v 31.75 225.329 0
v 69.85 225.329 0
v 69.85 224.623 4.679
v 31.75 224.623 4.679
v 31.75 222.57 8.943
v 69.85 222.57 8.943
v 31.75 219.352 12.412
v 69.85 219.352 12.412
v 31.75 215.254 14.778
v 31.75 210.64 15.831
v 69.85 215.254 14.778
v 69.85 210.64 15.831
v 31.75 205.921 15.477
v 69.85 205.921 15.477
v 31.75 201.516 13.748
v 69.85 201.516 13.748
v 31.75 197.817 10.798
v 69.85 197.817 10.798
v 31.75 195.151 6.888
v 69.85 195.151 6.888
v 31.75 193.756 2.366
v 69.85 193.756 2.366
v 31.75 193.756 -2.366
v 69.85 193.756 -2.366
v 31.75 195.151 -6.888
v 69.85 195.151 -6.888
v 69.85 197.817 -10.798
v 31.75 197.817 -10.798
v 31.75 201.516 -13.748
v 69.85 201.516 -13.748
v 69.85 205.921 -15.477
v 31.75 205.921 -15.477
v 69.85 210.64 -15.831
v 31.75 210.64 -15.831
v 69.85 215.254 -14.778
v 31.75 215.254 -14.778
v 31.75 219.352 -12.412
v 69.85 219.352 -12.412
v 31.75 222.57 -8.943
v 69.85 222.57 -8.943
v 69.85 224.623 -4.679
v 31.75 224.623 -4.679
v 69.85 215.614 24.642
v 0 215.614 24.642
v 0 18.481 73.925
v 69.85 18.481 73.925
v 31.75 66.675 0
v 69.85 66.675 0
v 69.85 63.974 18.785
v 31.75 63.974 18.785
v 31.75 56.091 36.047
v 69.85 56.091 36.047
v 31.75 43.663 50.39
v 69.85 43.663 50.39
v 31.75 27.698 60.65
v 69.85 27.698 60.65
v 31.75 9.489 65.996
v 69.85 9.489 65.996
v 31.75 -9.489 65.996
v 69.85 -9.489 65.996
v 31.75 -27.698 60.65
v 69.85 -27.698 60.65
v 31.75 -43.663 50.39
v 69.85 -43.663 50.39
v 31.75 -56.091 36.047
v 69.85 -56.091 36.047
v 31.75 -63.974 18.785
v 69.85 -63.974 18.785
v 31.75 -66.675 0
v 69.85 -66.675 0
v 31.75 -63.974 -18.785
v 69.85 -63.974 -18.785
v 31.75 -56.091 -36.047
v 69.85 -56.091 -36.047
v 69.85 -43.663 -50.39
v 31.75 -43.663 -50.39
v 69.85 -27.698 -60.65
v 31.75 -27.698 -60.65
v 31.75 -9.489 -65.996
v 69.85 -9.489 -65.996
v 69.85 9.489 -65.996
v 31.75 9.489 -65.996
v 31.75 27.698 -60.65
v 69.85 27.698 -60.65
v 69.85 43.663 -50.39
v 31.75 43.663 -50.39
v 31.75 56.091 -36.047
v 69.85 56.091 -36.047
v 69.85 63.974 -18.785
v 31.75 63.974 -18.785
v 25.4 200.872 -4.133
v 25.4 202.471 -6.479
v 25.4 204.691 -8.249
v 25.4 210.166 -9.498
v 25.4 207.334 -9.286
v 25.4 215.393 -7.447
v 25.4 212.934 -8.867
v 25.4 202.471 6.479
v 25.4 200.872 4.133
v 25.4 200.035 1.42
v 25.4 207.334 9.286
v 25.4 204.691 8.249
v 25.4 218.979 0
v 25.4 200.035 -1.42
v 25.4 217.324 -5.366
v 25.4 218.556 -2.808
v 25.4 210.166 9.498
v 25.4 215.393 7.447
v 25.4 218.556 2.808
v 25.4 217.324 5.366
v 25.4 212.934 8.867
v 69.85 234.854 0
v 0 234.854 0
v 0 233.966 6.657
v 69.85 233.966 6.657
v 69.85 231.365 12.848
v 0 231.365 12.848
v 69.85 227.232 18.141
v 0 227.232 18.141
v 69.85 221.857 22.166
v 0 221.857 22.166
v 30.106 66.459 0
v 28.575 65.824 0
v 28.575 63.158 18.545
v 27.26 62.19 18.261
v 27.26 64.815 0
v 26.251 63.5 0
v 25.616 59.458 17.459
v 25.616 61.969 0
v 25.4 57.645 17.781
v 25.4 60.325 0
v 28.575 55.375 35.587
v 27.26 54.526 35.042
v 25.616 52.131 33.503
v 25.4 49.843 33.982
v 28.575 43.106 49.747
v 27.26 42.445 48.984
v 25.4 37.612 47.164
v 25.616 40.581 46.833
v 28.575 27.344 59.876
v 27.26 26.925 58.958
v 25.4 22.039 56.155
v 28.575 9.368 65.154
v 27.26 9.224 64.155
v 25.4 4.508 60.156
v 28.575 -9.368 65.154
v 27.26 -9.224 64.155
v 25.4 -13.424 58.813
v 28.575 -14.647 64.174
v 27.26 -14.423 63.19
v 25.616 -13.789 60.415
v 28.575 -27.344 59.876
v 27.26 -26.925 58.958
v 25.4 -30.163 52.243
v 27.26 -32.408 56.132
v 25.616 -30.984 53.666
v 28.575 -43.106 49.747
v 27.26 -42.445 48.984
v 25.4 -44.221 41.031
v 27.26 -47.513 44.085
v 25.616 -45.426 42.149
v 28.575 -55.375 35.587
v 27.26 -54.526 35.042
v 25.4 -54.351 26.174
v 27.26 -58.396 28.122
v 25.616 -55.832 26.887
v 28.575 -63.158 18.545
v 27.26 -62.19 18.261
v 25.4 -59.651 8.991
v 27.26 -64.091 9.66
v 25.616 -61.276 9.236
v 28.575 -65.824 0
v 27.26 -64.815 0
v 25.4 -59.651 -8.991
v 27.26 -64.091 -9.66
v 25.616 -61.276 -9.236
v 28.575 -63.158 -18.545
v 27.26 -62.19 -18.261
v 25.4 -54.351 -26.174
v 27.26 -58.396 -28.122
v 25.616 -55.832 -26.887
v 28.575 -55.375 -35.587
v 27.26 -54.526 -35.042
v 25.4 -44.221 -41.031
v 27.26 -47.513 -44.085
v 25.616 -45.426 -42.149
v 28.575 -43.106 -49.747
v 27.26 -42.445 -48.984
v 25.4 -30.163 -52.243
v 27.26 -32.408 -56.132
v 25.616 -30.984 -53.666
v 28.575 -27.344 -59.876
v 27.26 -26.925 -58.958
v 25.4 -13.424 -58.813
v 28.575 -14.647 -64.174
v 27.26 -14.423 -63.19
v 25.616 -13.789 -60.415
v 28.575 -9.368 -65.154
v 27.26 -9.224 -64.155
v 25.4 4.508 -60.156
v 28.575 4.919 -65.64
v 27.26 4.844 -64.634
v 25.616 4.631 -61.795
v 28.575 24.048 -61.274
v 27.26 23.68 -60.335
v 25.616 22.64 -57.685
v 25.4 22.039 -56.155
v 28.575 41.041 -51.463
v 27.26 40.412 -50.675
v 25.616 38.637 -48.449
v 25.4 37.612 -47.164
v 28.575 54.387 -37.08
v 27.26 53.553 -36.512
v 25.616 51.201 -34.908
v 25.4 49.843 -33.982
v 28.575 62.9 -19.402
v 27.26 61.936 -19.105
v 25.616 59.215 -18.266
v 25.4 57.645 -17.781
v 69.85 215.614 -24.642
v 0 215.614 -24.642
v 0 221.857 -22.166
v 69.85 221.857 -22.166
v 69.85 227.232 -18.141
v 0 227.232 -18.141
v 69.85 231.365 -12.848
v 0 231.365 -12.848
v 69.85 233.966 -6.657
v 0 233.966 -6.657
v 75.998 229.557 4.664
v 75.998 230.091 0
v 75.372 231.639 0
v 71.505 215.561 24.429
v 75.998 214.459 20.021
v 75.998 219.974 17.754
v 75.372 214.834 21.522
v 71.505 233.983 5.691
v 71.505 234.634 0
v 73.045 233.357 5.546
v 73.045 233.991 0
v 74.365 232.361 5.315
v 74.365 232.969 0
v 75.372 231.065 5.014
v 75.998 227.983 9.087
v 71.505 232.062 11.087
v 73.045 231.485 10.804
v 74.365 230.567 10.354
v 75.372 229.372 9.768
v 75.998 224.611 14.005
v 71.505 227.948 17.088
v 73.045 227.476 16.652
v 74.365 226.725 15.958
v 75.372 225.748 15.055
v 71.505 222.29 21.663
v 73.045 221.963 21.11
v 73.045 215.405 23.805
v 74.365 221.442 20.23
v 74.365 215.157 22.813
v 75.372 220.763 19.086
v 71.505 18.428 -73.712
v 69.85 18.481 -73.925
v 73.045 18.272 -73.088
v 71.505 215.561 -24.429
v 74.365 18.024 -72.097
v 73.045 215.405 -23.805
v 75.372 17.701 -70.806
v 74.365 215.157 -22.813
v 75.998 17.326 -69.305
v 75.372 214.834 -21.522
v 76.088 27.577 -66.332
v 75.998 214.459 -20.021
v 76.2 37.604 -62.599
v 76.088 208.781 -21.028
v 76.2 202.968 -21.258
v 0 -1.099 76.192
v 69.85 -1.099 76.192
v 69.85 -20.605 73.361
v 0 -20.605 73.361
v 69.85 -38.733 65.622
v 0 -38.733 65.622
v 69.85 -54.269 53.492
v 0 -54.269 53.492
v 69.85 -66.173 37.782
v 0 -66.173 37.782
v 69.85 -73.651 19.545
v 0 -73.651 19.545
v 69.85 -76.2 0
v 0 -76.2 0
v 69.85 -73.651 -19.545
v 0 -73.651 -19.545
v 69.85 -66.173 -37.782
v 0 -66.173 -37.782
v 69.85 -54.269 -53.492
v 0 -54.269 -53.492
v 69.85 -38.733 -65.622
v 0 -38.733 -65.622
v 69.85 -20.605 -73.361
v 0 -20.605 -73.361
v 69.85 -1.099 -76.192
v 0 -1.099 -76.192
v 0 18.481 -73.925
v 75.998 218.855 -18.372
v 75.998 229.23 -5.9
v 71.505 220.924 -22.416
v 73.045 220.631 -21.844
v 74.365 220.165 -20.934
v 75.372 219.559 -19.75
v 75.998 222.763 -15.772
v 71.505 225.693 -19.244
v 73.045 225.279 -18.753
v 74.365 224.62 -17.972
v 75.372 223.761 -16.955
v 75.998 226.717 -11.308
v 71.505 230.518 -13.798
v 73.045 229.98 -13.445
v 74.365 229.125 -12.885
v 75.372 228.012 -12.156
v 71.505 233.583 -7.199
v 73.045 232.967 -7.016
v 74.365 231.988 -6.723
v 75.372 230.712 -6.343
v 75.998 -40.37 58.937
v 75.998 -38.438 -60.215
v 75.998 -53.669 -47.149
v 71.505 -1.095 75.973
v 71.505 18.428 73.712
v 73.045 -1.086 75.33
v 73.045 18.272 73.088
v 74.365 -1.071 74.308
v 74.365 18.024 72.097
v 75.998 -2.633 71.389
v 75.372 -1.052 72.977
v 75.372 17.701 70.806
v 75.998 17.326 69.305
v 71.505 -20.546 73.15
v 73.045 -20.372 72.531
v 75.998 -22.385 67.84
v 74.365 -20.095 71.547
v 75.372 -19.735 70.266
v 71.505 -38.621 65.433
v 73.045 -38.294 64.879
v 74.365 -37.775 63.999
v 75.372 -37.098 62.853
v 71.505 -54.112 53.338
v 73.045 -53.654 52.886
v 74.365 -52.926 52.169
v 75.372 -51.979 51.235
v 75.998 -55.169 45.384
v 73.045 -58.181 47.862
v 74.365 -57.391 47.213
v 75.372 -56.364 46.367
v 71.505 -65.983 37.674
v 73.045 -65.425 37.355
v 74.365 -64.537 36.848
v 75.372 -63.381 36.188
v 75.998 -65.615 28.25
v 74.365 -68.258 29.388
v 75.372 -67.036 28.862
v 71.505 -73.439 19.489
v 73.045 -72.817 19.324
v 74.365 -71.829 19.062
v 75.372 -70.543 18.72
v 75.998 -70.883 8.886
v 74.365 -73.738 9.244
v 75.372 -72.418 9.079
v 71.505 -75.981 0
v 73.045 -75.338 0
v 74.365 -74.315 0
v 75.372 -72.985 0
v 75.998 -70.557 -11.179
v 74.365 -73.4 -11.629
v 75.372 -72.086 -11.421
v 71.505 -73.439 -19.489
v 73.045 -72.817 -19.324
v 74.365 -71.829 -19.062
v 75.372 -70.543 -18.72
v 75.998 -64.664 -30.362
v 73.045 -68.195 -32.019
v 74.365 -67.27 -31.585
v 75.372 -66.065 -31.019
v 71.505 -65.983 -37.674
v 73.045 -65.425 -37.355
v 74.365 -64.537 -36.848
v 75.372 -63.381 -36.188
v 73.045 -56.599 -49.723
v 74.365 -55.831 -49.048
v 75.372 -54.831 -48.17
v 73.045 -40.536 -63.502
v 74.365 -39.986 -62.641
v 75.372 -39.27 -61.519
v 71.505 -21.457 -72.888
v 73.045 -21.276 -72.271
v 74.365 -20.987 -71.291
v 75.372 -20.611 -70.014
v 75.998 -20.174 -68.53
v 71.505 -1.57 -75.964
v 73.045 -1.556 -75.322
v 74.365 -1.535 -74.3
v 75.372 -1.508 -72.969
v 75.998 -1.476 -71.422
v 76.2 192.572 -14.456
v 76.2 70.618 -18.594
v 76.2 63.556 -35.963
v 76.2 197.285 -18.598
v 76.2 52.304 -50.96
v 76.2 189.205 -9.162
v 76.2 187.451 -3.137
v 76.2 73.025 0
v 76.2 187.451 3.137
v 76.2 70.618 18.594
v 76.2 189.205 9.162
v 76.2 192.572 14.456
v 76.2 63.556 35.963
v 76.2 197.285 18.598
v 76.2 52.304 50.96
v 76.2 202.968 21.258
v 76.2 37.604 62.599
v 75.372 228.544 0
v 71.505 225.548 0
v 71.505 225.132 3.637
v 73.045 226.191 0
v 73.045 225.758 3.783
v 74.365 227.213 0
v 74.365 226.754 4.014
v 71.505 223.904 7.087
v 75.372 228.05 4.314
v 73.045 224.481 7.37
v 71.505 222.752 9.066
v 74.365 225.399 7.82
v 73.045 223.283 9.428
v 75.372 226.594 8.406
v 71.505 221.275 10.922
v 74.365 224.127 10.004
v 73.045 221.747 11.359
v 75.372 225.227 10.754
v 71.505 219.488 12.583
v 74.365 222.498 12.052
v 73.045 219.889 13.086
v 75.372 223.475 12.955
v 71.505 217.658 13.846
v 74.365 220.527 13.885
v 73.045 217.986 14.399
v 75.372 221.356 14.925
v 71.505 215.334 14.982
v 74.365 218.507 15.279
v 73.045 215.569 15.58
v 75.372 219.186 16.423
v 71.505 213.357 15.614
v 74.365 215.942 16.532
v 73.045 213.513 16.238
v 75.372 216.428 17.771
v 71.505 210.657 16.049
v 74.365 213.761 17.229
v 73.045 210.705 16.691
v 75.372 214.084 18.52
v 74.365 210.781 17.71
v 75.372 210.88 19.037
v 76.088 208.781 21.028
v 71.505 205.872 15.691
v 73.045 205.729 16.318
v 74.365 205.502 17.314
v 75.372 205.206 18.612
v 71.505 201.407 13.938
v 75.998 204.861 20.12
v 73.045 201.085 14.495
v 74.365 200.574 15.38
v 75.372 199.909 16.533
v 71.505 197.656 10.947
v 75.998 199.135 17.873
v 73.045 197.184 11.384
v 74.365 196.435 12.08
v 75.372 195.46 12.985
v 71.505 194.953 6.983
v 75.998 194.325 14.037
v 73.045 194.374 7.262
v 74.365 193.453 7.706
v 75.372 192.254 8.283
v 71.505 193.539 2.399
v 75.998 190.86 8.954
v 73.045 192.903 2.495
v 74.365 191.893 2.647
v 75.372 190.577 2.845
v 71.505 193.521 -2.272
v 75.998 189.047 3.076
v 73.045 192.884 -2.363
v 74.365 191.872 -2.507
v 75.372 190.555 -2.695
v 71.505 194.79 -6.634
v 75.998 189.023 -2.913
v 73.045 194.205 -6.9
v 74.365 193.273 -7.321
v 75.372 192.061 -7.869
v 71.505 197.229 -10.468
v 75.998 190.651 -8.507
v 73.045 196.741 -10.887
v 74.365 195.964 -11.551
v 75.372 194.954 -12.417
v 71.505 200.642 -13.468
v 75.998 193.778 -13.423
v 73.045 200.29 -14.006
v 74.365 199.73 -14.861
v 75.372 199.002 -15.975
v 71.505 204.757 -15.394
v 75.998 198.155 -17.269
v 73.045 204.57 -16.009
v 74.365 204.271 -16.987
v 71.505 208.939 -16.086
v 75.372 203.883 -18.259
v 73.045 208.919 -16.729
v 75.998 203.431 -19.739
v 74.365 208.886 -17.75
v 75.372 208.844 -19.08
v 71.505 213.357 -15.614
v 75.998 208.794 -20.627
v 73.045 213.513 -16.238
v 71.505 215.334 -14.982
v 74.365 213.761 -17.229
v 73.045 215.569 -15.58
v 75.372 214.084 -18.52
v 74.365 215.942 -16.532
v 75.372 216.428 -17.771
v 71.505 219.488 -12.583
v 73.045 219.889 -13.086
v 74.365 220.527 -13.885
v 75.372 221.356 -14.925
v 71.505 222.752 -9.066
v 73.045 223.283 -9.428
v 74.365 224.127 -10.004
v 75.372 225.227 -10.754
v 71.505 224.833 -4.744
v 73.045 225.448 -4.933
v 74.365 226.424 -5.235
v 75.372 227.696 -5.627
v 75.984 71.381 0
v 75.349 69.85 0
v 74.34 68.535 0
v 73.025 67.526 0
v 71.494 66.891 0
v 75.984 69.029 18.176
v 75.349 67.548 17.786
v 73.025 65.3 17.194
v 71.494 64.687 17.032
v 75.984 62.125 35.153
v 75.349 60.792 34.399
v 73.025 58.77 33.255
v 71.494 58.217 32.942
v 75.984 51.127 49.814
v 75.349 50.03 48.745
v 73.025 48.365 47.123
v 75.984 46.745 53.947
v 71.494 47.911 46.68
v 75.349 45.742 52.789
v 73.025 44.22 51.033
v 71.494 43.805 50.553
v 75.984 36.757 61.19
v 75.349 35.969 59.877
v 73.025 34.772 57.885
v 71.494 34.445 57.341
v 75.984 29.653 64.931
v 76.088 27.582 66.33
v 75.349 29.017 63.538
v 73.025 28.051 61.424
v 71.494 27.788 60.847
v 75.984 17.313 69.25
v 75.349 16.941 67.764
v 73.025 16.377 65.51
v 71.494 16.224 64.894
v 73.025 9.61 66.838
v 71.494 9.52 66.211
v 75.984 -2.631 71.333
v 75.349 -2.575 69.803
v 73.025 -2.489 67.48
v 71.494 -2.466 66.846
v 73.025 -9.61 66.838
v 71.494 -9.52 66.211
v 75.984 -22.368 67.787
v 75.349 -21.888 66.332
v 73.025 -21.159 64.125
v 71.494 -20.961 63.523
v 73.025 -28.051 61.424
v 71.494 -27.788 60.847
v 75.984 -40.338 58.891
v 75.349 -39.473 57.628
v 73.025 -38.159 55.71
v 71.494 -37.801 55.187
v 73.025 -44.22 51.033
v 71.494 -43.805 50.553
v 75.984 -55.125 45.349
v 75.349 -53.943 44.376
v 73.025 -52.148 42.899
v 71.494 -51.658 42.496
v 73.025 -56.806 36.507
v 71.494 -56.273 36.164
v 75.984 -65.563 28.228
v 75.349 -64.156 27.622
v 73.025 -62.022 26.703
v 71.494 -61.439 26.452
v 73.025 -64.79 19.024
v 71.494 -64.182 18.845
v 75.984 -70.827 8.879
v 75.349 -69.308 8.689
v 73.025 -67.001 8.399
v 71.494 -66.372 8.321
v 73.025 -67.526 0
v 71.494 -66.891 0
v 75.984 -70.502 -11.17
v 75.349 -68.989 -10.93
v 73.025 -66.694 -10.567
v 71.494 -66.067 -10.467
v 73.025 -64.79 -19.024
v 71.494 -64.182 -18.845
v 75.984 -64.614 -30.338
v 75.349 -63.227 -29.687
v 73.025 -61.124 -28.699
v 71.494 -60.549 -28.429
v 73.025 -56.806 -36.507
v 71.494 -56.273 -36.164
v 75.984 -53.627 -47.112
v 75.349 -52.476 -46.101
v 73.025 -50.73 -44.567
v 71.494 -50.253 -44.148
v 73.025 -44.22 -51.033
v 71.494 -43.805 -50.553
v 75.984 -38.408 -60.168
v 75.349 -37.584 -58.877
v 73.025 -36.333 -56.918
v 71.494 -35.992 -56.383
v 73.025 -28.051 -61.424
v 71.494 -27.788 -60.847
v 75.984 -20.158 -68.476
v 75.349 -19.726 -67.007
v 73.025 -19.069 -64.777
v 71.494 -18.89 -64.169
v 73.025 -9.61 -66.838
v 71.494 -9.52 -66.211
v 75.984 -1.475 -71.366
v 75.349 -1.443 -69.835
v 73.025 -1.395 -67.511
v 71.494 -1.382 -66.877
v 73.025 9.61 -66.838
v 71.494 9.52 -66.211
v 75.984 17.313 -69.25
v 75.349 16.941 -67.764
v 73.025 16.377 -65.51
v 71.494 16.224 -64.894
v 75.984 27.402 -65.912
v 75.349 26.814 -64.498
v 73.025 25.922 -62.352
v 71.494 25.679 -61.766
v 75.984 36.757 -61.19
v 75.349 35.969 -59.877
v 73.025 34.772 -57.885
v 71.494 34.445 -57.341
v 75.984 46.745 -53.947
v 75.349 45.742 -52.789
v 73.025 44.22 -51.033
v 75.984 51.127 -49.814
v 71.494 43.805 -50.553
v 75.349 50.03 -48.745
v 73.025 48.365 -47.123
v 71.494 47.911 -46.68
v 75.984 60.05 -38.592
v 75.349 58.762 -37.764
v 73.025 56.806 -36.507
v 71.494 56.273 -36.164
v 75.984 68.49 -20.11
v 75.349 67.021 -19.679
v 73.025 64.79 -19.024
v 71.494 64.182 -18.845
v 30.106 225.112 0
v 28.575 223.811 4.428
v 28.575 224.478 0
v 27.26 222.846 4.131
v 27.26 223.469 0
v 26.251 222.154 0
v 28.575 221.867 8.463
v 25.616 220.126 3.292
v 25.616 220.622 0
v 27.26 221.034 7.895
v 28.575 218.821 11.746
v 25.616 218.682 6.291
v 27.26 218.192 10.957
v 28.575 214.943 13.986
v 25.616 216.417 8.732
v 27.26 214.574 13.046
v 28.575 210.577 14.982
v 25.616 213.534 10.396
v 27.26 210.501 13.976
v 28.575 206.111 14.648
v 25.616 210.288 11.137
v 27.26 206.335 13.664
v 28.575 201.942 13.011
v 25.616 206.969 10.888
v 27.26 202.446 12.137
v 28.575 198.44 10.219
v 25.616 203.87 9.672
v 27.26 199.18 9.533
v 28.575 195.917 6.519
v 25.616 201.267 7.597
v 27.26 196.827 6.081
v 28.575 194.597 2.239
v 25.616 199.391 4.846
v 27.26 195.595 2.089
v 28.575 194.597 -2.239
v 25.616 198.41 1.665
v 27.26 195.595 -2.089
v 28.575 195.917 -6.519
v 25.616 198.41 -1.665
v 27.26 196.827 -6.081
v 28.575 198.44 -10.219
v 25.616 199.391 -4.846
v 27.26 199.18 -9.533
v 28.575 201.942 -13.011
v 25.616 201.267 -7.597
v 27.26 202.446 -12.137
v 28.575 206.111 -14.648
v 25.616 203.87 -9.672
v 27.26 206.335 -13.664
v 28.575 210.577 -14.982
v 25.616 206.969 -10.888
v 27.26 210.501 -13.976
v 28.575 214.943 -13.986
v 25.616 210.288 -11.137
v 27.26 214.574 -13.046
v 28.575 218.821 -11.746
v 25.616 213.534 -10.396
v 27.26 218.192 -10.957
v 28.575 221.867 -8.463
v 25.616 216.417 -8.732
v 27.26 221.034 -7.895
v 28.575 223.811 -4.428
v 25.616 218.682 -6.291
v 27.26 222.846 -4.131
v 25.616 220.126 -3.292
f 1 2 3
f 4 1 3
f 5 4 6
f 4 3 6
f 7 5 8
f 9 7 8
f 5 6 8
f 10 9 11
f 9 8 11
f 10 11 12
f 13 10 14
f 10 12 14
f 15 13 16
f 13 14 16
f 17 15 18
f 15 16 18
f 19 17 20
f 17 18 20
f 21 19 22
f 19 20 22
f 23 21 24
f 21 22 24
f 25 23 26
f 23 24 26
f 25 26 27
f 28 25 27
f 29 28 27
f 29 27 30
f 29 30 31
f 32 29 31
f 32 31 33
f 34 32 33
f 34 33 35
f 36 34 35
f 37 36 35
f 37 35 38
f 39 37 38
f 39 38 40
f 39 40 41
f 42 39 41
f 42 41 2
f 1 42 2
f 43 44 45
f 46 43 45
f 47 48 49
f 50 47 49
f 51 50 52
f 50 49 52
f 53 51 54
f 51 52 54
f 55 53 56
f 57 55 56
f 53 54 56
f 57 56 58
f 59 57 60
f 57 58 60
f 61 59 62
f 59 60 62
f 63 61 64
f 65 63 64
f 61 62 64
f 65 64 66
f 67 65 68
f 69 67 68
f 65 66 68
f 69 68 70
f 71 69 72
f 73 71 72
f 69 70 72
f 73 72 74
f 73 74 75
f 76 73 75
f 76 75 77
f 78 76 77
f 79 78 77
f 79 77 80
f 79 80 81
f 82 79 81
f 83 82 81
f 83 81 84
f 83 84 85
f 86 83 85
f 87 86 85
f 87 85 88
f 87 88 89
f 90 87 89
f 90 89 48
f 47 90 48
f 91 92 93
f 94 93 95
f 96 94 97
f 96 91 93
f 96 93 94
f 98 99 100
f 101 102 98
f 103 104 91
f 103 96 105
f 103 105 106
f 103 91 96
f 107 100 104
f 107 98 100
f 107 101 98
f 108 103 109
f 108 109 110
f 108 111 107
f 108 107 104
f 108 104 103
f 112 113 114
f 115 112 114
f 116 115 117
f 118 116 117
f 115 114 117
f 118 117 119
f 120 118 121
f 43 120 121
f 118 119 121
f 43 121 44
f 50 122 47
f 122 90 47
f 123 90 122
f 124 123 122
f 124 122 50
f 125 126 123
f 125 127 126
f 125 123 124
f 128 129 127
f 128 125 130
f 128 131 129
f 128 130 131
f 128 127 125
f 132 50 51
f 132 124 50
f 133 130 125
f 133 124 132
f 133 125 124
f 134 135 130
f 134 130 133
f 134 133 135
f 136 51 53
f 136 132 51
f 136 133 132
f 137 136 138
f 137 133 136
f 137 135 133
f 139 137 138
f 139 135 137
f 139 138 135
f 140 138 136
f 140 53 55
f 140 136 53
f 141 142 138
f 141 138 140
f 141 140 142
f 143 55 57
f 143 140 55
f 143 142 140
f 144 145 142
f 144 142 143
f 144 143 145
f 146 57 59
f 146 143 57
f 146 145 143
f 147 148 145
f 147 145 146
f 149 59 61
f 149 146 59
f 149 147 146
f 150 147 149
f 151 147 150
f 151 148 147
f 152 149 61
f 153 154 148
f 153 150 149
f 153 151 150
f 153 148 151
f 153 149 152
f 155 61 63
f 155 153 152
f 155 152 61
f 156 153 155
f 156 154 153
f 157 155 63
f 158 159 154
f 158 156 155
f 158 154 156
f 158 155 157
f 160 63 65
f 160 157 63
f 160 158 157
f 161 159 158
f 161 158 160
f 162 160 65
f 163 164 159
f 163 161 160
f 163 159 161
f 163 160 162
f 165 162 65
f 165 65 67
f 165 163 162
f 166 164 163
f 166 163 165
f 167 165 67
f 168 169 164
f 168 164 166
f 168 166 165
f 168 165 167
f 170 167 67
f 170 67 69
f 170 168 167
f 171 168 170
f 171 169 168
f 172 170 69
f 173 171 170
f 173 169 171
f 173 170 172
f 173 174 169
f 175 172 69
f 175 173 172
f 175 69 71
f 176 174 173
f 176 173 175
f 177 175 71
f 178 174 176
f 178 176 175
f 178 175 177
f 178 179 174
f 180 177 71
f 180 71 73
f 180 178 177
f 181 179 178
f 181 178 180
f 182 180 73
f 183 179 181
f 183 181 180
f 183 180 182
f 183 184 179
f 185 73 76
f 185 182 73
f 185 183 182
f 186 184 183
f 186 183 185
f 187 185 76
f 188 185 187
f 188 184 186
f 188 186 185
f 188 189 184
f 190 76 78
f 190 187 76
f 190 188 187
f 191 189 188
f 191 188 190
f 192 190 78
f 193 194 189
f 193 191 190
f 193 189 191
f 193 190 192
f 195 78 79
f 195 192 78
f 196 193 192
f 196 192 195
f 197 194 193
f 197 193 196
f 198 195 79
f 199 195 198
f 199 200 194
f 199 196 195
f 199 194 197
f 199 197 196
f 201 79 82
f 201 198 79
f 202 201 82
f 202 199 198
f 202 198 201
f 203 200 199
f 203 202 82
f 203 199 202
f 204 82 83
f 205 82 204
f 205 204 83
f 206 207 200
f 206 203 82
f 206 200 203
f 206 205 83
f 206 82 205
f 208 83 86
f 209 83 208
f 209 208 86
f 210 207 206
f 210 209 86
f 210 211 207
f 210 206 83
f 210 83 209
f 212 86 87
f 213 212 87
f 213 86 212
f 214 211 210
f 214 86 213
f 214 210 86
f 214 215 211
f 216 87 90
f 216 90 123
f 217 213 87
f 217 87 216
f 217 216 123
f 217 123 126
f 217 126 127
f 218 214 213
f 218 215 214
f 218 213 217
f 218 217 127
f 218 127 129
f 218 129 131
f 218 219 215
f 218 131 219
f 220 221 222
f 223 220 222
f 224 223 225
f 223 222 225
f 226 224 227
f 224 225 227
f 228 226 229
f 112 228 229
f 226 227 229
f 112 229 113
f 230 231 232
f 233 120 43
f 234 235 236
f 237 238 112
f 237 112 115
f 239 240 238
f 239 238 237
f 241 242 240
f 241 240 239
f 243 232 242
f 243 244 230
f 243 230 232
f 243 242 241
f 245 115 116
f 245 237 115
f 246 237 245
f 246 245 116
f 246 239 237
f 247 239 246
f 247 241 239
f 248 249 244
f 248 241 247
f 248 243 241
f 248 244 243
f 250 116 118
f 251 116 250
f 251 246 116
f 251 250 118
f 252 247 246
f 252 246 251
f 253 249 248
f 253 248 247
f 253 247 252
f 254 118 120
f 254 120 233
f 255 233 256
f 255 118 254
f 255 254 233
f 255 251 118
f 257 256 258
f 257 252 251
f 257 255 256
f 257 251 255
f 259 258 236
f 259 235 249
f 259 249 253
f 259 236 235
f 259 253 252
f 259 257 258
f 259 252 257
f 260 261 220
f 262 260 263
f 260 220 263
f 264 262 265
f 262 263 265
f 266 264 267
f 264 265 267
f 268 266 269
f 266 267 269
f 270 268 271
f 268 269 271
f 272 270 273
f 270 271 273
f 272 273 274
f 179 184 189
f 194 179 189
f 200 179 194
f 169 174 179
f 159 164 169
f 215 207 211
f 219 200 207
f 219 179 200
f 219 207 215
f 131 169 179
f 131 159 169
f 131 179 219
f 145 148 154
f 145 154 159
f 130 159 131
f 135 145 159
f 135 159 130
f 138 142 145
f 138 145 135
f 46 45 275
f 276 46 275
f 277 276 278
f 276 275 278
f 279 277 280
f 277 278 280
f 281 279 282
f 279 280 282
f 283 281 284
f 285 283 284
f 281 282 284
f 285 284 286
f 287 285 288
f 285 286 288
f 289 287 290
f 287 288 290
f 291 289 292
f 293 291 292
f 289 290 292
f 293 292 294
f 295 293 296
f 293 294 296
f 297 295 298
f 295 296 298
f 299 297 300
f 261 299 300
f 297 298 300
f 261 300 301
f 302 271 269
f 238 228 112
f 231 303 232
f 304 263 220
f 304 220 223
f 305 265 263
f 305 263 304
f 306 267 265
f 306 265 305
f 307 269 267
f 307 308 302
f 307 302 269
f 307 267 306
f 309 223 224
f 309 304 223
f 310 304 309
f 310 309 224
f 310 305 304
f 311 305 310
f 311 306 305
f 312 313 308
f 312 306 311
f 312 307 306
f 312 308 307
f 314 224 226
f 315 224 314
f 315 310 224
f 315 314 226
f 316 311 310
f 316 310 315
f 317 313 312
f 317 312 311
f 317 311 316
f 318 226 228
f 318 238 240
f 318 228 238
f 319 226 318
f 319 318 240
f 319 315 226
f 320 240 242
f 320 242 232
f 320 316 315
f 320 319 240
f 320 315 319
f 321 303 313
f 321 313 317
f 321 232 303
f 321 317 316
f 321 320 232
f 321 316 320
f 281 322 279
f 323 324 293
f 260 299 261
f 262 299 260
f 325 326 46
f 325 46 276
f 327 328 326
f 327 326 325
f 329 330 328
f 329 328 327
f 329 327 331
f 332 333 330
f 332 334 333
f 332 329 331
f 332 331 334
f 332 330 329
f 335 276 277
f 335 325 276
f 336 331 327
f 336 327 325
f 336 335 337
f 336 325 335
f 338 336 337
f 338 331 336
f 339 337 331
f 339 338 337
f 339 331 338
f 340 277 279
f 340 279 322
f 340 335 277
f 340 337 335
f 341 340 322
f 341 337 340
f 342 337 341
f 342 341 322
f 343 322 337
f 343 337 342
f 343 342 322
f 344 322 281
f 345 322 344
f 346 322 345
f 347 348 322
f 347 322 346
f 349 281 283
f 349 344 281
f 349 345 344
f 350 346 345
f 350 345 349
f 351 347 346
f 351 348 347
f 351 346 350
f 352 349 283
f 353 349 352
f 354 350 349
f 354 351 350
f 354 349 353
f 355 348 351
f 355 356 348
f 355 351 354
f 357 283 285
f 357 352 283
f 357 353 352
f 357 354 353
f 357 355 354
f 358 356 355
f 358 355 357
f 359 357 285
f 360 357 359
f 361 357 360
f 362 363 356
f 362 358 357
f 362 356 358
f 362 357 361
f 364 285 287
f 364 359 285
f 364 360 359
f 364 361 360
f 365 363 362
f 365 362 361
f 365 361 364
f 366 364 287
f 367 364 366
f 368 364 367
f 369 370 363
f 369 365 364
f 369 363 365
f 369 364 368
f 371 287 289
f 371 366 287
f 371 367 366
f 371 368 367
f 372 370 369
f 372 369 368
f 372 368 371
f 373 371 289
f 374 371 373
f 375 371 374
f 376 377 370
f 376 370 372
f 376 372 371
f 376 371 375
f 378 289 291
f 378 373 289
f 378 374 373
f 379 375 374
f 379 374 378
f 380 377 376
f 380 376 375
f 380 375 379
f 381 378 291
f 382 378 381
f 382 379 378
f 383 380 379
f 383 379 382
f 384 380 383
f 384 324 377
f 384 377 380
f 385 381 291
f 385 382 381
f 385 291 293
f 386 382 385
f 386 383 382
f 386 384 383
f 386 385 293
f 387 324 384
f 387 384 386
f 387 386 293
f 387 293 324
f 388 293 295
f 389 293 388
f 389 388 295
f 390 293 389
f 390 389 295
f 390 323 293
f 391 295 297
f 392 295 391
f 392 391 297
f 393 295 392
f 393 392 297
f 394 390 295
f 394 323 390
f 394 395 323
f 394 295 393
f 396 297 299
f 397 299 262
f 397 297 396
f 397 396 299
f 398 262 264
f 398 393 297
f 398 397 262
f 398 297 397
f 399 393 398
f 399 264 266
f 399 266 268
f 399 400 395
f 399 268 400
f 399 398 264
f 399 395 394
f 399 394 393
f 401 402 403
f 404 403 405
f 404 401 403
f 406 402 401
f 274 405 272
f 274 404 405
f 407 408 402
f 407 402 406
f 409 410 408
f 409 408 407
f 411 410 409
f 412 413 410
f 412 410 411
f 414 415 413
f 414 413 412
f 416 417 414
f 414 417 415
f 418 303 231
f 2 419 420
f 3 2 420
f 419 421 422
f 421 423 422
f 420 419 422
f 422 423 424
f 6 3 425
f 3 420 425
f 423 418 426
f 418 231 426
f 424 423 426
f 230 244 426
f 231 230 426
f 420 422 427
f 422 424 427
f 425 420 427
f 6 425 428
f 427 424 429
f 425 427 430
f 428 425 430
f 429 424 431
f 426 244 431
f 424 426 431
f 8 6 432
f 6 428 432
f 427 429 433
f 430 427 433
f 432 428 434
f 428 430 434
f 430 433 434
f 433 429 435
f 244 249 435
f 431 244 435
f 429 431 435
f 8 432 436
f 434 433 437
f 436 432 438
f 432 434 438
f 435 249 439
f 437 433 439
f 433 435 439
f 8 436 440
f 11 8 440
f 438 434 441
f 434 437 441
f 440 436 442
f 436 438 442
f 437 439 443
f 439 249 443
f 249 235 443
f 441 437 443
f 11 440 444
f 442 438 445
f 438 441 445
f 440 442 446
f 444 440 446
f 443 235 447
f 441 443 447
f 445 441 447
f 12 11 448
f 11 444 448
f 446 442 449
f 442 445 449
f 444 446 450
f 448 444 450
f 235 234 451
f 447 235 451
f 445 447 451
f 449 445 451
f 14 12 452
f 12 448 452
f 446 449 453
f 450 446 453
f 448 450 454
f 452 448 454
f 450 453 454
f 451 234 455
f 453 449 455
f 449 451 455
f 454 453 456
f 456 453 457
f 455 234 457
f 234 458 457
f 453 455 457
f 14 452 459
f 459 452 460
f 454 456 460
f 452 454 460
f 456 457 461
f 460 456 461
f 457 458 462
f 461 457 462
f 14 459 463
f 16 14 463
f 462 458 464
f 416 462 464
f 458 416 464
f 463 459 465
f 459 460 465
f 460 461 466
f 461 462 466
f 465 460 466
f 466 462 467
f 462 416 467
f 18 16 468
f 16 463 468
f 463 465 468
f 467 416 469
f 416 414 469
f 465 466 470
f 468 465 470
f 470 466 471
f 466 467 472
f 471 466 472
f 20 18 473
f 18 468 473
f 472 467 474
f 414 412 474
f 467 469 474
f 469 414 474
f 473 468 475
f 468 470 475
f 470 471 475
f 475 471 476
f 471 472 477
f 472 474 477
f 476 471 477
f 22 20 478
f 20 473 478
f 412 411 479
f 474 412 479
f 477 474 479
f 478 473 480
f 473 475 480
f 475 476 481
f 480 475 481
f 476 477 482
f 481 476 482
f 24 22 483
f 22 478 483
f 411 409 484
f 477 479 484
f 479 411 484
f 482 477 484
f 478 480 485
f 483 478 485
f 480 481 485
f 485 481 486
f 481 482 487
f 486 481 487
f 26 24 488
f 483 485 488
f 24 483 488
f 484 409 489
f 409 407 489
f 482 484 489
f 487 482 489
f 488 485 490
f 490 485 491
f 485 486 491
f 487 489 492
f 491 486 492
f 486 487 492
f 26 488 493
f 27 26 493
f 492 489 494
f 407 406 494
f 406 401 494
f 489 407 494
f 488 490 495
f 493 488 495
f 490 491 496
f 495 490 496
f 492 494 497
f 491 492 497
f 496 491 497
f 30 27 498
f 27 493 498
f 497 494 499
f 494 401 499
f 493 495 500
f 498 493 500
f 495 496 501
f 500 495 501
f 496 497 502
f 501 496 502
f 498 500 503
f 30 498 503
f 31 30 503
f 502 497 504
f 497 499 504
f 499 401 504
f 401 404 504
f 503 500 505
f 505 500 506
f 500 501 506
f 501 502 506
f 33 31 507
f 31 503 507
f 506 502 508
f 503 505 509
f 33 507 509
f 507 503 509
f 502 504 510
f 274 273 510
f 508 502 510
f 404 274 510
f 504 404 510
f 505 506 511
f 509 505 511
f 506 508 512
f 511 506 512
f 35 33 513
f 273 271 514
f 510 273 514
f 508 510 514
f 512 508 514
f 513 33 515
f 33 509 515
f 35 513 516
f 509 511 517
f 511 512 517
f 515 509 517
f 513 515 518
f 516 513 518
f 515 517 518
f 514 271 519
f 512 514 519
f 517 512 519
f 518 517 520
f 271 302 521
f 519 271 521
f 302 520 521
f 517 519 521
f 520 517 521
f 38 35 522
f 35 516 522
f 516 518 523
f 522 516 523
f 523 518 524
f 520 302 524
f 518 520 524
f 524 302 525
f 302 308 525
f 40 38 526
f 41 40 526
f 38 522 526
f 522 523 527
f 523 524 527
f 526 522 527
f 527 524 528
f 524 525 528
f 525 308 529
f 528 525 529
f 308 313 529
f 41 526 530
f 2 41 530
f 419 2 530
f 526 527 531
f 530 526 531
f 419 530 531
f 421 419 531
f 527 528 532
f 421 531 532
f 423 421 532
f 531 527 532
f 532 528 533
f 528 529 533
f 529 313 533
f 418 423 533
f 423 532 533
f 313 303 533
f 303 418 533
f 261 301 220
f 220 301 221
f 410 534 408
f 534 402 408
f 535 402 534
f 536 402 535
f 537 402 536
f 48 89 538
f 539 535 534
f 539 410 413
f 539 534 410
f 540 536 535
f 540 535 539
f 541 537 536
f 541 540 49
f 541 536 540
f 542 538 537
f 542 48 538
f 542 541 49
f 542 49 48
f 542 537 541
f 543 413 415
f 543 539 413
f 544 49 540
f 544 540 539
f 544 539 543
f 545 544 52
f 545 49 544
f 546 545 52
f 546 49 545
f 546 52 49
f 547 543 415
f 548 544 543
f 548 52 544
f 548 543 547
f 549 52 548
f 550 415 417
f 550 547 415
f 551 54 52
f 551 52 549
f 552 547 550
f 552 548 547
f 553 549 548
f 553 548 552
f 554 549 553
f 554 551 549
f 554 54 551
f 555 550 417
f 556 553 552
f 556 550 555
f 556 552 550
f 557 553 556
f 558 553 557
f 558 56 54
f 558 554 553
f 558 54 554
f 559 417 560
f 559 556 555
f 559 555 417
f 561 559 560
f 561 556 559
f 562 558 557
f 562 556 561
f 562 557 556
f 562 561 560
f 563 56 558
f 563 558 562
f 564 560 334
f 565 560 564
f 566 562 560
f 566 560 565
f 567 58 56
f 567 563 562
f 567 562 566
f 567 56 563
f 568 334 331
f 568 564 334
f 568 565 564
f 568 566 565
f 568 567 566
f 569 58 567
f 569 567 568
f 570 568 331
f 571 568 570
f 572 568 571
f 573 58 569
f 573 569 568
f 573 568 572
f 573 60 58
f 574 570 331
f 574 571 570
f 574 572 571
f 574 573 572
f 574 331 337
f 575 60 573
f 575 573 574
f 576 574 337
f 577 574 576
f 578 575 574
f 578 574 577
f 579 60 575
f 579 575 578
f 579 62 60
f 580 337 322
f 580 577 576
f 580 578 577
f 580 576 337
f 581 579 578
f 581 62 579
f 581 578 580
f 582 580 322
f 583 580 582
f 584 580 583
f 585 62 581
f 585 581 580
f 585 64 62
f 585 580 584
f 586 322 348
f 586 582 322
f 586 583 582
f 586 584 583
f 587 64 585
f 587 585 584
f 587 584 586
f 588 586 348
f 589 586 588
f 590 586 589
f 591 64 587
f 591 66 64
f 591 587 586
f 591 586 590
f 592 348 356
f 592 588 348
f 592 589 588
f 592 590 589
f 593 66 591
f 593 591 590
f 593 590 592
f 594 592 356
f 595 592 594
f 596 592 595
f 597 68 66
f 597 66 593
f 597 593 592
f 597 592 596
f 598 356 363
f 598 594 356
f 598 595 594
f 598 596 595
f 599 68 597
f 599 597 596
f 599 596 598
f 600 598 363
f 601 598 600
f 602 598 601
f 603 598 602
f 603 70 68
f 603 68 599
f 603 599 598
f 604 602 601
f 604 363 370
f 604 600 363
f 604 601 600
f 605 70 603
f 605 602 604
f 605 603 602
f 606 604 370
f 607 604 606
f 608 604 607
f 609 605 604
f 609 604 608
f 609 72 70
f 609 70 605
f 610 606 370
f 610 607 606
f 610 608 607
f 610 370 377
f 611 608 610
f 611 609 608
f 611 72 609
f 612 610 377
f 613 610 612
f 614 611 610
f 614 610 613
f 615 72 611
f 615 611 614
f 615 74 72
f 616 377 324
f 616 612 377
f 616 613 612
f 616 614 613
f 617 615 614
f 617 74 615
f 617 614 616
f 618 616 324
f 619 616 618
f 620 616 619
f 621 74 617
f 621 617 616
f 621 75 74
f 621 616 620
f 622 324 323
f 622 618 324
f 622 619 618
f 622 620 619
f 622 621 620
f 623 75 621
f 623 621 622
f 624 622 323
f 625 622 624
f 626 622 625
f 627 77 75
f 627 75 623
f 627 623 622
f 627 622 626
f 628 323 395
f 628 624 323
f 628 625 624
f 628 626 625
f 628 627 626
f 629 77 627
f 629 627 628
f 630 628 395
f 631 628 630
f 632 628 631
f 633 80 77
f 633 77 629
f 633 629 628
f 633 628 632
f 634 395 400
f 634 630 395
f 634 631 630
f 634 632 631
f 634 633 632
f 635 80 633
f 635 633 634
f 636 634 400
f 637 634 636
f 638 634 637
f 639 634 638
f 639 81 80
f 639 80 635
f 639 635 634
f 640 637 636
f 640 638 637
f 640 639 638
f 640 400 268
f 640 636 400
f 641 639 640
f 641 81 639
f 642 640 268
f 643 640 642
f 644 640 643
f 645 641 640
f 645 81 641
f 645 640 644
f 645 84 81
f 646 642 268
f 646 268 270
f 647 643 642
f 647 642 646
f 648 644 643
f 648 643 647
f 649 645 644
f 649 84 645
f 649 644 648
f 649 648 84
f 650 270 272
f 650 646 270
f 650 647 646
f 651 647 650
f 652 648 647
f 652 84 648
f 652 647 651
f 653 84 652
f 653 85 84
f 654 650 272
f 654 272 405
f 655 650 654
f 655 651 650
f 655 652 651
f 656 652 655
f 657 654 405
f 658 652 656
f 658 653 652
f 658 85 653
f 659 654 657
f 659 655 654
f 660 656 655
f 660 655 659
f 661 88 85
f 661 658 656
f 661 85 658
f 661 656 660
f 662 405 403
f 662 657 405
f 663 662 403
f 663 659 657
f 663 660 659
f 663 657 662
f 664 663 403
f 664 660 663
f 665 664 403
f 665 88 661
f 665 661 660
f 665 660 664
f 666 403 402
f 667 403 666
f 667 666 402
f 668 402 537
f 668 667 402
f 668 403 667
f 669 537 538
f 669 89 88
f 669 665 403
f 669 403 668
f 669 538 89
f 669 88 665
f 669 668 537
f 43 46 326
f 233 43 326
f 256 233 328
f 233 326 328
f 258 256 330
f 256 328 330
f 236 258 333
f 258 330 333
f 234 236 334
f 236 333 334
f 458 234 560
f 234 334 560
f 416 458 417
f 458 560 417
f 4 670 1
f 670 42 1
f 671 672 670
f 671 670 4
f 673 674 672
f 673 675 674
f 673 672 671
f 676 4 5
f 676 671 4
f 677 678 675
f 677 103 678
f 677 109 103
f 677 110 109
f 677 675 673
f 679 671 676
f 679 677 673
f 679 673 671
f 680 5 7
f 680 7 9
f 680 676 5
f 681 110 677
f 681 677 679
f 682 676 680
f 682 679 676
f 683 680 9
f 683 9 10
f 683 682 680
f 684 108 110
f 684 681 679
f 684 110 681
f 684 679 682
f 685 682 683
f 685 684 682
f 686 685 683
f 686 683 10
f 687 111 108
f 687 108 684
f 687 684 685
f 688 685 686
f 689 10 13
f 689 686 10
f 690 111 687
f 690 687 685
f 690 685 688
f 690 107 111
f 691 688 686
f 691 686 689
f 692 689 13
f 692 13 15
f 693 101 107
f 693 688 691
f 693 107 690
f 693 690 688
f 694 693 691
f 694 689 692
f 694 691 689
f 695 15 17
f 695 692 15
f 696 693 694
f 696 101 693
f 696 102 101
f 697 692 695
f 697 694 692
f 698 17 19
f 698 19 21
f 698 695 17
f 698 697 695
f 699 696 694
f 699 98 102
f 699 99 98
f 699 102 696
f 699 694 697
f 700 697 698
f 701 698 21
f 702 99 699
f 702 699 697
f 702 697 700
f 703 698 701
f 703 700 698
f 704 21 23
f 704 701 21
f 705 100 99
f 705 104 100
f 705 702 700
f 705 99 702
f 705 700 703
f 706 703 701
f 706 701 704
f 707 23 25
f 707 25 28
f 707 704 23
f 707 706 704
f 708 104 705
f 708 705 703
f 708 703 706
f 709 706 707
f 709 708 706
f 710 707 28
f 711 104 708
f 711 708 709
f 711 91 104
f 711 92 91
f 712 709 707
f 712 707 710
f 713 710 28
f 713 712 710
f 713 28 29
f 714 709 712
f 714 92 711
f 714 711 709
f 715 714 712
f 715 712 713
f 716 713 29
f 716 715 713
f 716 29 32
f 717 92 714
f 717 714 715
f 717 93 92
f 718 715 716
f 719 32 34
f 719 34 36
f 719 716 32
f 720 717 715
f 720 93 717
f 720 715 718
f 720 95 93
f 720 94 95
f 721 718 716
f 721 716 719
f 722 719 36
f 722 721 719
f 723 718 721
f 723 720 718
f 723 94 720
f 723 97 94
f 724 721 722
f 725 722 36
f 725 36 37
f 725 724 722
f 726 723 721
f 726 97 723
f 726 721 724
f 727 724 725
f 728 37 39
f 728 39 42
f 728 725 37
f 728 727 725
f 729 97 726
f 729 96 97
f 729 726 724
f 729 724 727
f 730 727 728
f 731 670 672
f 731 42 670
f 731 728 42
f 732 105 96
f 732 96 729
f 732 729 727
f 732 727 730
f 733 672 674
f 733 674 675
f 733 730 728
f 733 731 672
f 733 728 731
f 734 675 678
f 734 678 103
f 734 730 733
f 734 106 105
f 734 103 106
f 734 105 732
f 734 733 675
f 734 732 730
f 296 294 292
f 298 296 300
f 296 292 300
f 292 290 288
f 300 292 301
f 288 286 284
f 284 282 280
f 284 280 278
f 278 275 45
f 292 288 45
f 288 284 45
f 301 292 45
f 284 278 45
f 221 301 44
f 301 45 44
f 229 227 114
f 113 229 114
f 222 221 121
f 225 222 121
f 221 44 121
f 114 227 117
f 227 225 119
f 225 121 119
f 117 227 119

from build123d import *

# Parameters (mm, degrees)
F1_DEPTH = 76.2
F2_R     = 66.675
F2_R_2   = 15.875
F3_DEPTH = 50.8
F4_F1_R  = 6.35
F4_F2_R  = 6.35
F4_F3_R  = 6.35


# Not quite as in the source:
# - a fillet or chamfer that OpenCascade refuses, or shapes differently, is made with other operations: its cross-section is extruded or revolved along the edge and cut away or added


with BuildPart() as f1:
    # F0 (on Right) → F1 (new body)
    with BuildSketch(Plane.YZ):
        with BuildLine():
            ThreePointArc((18.4812146278, -73.9248585111), (60.0612543768, -46.8944103565), (76.2, 0))
            ThreePointArc((76.2, 0), (60.0612543768, 46.8944103565), (18.4812146278, 73.9248585111))
            ThreePointArc((18.4812146278, 73.9248585111), (-76.2, 0), (18.4812146278, -73.9248585111))
        make_face()
        with BuildLine():
            ThreePointArc((18.4812146278, 73.9248585111), (60.0612543768, 46.8944103565), (76.2, 0))
            ThreePointArc((76.2, 0), (60.0612543768, -46.8944103565), (18.4812146278, -73.9248585111))
            Line((18.4812146278, -73.9248585111), (215.6141706573, -24.6416195037))
            ThreePointArc((215.6141706573, -24.6416195037), (184.0537657814, 0), (215.6141706573, 24.6416195037))
            Line((215.6141706573, 24.6416195037), (18.4812146278, 73.9248585111))
        make_face()
        with BuildLine():
            ThreePointArc((234.8537657814, 0), (229.474183907, 15.6314701188), (215.6141706573, 24.6416195037))
            ThreePointArc((215.6141706573, 24.6416195037), (184.0537657814, 0), (215.6141706573, -24.6416195037))
            ThreePointArc((215.6141706573, -24.6416195037), (229.474183907, -15.6314701188), (234.8537657814, 0))
        make_face()
    extrude(amount=F1_DEPTH)

    # F2 (on face) → F3 (cut)
    with BuildSketch(Plane.YZ.offset(76.2)):
        Circle(F2_R)
        with Locations((209.4537657814, 0)):
            Circle(F2_R_2)
    extrude(amount=-F3_DEPTH, mode=Mode.SUBTRACT)

    # F4: fillet of radius 6.35 on 8 edges, made by hand

    # F4_f1
    f4_f1_edges = [f1.edges().sort_by_distance(p)[0] for p in [
        (76.2, -76.2, 0),
        (76.2, 117.0476926425, 49.2832390074),
        (76.2, 117.0476926425, -49.2832390074),
        (76.2, 234.8537657814, 0),
    ]]
    fillet(f4_f1_edges, radius=F4_F1_R)

    # F4_f2
    f4_f2_edges = [f1.edges().sort_by_distance(p)[0] for p in [
        (25.4, -66.675, 0),
    ]]
    fillet(f4_f2_edges, radius=F4_F2_R)

    # F4_f3
    f4_f3_edges = [f1.edges().sort_by_distance(p)[0] for p in [
        (25.4, 193.5787657814, 0),
    ]]
    fillet(f4_f3_edges, radius=F4_F3_R)

    # F4_s4 → F4_t5 (revolve, cut)
    with BuildSketch(Plane.XY):
        with BuildLine():
            ThreePointArc((76.2, 73.025), (74.3401280605, 68.5348719395), (69.85, 66.675))
            Line((69.85, 66.675), (69.85, 66.548))
            Line((69.85, 66.548), (76.327, 66.548))
            Line((76.327, 66.548), (76.327, 73.025))
            Line((76.327, 73.025), (76.2, 73.025))
        make_face()
    revolve(axis=Axis((76.2, 0, 0), (1, 0, 0)), mode=Mode.SUBTRACT)

    # F4_s6 → F4_t7 (revolve, cut)
    with BuildSketch(Plane.XY):
        with BuildLine():
            ThreePointArc((69.85, 225.3287657814), (74.3401280605, 227.1886377208), (76.2, 231.6787657814))
            Line((76.2, 231.6787657814), (76.327, 231.6787657814))
            Line((76.327, 231.6787657814), (76.327, 225.2017657814))
            Line((76.327, 225.2017657814), (69.85, 225.2017657814))
            Line((69.85, 225.2017657814), (69.85, 225.3287657814))
        make_face()
    revolve(axis=Axis((76.2, 209.4537657814, 0), (1, 0, 0)), mode=Mode.SUBTRACT)


solid = f1.part
